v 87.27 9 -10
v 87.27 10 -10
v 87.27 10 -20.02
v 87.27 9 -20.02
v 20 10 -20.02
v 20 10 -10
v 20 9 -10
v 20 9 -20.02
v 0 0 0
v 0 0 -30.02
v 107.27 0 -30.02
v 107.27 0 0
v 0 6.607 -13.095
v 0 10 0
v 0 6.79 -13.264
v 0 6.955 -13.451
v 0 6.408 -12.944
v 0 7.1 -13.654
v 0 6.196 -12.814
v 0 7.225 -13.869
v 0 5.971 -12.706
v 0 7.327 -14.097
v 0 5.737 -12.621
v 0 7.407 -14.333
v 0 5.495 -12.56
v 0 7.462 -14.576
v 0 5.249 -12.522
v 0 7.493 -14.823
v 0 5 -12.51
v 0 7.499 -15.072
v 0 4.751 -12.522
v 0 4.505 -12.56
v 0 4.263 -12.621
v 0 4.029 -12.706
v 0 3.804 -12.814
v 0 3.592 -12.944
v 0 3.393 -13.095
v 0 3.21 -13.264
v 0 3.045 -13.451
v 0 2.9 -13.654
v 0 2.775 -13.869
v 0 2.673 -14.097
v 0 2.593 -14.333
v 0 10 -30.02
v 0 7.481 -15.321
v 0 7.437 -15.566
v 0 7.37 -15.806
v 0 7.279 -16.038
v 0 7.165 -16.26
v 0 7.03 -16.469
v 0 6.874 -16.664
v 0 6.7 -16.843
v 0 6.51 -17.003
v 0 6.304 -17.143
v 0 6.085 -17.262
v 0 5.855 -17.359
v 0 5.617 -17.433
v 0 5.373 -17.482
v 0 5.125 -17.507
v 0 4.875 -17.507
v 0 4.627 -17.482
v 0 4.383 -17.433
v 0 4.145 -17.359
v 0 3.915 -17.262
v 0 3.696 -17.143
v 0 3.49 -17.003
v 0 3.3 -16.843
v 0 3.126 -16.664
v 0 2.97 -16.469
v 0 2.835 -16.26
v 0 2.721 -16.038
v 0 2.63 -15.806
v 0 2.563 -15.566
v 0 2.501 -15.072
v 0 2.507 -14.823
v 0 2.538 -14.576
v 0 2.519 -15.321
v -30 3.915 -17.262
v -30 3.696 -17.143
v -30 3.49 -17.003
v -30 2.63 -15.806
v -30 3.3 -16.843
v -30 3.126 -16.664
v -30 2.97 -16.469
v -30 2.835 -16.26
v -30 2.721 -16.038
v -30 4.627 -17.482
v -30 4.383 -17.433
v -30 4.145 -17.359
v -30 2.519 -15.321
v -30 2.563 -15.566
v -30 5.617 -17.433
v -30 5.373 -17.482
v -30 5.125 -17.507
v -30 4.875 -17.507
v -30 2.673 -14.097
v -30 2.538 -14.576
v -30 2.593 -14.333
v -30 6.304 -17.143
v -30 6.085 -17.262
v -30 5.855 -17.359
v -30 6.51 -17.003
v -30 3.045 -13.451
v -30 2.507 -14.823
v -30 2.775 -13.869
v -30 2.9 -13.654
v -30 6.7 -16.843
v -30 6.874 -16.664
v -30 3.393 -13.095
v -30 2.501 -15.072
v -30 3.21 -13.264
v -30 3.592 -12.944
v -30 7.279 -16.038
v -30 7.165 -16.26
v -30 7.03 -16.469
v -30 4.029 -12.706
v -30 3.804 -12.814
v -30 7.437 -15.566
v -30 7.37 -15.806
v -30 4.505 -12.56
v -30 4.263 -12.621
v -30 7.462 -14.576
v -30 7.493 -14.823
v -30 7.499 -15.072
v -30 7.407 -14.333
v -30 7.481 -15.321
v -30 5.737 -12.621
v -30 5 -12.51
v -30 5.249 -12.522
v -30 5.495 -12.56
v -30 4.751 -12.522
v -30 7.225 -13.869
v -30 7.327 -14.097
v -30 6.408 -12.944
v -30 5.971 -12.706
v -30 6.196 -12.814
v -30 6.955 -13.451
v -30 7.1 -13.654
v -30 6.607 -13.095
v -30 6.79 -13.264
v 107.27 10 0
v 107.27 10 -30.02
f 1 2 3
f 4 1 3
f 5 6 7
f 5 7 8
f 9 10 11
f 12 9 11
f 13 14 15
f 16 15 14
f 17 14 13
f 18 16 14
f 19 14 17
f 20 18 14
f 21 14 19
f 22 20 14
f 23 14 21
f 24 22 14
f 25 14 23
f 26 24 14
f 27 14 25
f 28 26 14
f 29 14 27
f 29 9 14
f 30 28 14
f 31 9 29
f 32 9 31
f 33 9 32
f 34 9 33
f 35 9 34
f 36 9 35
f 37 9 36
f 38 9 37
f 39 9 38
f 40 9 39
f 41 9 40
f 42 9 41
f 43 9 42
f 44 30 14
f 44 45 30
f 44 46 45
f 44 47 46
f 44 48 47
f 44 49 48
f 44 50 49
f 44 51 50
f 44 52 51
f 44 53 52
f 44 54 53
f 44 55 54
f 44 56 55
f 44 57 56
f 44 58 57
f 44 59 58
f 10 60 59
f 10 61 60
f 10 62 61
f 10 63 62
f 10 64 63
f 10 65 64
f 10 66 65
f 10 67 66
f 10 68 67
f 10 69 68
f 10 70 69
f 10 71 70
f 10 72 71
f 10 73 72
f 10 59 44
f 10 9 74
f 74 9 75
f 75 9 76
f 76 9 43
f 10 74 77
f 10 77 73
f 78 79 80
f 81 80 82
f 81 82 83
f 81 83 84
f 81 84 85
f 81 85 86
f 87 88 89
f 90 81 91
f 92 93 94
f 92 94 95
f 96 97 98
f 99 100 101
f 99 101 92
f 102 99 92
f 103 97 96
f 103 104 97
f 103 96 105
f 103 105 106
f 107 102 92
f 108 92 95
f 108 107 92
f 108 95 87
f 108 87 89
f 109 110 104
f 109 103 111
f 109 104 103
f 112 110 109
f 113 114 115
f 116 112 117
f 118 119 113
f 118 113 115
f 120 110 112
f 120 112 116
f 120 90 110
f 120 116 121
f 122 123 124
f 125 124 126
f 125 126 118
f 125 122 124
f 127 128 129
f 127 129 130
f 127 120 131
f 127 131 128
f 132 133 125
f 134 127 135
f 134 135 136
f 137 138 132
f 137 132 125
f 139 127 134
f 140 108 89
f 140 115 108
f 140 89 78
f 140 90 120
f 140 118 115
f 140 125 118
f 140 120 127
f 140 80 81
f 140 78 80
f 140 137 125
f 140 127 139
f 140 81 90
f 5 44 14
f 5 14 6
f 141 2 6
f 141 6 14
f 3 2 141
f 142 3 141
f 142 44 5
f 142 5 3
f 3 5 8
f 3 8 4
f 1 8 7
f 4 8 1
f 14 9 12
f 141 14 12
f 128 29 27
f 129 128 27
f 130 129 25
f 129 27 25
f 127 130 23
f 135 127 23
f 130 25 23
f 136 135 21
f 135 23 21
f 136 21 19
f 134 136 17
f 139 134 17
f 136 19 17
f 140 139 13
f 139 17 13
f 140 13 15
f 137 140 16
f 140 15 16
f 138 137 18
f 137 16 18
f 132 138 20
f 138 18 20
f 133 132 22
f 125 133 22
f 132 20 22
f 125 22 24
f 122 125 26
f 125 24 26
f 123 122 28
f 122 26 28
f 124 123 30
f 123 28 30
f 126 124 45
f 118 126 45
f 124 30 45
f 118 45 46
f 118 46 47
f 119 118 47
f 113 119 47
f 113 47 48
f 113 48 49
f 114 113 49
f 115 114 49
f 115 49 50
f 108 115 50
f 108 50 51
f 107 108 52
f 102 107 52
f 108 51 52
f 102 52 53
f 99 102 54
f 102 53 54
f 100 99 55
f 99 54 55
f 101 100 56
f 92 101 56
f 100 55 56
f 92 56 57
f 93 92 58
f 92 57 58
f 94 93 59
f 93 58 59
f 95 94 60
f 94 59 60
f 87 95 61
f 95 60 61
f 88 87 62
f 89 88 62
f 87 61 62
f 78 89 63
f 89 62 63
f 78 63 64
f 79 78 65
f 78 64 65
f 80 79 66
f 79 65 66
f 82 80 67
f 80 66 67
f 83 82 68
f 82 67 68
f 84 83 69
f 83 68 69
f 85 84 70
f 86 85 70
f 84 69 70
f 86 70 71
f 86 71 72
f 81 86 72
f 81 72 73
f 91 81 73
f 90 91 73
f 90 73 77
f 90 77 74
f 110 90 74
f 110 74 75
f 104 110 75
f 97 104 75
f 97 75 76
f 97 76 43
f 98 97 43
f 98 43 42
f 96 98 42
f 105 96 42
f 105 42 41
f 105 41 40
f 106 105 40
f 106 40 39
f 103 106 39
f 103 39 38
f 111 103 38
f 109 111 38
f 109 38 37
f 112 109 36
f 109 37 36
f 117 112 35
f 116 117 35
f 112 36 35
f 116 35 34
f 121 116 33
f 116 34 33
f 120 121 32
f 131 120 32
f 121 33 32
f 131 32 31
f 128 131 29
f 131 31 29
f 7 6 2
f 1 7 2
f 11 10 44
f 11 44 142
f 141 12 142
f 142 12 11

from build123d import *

# Parameters (mm, degrees)
SKETCH1_W           = 107.27
SKETCH1_H           = 30.02
BOSS_EXTRUDE1_DEPTH = 10
SKETCH2_R           = 2.5
BOSS_EXTRUDE2_DEPTH = 30
SKETCH3_W           = 67.27
SKETCH3_H           = 10.02
CUT_EXTRUDE1_DEPTH  = 1


with BuildPart() as part:
    # Sketch1 → Boss-Extrude1 (new body)
    with BuildSketch(Plane(origin=(0, 0, 0), x_dir=(1, 0, 0), z_dir=(0, 1, 0))):
        with Locations((53.635, 15.01)):
            Rectangle(SKETCH1_W, SKETCH1_H)
    extrude(amount=BOSS_EXTRUDE1_DEPTH)

    # Sketch2 → Boss-Extrude2 (add)
    with BuildSketch(Plane.ZY):
        with Locations((-15.01, 5)):
            Circle(SKETCH2_R)
    extrude(amount=BOSS_EXTRUDE2_DEPTH)

    # Sketch3 → Cut-Extrude1 (cut)
    with BuildSketch(Plane(origin=(0, 10, 0), x_dir=(1, 0, 0), z_dir=(0, 1, 0))):
        with Locations((53.635, 15.01)):
            Rectangle(SKETCH3_W, SKETCH3_H)
    extrude(amount=-CUT_EXTRUDE1_DEPTH, mode=Mode.SUBTRACT)


solid = part.part
